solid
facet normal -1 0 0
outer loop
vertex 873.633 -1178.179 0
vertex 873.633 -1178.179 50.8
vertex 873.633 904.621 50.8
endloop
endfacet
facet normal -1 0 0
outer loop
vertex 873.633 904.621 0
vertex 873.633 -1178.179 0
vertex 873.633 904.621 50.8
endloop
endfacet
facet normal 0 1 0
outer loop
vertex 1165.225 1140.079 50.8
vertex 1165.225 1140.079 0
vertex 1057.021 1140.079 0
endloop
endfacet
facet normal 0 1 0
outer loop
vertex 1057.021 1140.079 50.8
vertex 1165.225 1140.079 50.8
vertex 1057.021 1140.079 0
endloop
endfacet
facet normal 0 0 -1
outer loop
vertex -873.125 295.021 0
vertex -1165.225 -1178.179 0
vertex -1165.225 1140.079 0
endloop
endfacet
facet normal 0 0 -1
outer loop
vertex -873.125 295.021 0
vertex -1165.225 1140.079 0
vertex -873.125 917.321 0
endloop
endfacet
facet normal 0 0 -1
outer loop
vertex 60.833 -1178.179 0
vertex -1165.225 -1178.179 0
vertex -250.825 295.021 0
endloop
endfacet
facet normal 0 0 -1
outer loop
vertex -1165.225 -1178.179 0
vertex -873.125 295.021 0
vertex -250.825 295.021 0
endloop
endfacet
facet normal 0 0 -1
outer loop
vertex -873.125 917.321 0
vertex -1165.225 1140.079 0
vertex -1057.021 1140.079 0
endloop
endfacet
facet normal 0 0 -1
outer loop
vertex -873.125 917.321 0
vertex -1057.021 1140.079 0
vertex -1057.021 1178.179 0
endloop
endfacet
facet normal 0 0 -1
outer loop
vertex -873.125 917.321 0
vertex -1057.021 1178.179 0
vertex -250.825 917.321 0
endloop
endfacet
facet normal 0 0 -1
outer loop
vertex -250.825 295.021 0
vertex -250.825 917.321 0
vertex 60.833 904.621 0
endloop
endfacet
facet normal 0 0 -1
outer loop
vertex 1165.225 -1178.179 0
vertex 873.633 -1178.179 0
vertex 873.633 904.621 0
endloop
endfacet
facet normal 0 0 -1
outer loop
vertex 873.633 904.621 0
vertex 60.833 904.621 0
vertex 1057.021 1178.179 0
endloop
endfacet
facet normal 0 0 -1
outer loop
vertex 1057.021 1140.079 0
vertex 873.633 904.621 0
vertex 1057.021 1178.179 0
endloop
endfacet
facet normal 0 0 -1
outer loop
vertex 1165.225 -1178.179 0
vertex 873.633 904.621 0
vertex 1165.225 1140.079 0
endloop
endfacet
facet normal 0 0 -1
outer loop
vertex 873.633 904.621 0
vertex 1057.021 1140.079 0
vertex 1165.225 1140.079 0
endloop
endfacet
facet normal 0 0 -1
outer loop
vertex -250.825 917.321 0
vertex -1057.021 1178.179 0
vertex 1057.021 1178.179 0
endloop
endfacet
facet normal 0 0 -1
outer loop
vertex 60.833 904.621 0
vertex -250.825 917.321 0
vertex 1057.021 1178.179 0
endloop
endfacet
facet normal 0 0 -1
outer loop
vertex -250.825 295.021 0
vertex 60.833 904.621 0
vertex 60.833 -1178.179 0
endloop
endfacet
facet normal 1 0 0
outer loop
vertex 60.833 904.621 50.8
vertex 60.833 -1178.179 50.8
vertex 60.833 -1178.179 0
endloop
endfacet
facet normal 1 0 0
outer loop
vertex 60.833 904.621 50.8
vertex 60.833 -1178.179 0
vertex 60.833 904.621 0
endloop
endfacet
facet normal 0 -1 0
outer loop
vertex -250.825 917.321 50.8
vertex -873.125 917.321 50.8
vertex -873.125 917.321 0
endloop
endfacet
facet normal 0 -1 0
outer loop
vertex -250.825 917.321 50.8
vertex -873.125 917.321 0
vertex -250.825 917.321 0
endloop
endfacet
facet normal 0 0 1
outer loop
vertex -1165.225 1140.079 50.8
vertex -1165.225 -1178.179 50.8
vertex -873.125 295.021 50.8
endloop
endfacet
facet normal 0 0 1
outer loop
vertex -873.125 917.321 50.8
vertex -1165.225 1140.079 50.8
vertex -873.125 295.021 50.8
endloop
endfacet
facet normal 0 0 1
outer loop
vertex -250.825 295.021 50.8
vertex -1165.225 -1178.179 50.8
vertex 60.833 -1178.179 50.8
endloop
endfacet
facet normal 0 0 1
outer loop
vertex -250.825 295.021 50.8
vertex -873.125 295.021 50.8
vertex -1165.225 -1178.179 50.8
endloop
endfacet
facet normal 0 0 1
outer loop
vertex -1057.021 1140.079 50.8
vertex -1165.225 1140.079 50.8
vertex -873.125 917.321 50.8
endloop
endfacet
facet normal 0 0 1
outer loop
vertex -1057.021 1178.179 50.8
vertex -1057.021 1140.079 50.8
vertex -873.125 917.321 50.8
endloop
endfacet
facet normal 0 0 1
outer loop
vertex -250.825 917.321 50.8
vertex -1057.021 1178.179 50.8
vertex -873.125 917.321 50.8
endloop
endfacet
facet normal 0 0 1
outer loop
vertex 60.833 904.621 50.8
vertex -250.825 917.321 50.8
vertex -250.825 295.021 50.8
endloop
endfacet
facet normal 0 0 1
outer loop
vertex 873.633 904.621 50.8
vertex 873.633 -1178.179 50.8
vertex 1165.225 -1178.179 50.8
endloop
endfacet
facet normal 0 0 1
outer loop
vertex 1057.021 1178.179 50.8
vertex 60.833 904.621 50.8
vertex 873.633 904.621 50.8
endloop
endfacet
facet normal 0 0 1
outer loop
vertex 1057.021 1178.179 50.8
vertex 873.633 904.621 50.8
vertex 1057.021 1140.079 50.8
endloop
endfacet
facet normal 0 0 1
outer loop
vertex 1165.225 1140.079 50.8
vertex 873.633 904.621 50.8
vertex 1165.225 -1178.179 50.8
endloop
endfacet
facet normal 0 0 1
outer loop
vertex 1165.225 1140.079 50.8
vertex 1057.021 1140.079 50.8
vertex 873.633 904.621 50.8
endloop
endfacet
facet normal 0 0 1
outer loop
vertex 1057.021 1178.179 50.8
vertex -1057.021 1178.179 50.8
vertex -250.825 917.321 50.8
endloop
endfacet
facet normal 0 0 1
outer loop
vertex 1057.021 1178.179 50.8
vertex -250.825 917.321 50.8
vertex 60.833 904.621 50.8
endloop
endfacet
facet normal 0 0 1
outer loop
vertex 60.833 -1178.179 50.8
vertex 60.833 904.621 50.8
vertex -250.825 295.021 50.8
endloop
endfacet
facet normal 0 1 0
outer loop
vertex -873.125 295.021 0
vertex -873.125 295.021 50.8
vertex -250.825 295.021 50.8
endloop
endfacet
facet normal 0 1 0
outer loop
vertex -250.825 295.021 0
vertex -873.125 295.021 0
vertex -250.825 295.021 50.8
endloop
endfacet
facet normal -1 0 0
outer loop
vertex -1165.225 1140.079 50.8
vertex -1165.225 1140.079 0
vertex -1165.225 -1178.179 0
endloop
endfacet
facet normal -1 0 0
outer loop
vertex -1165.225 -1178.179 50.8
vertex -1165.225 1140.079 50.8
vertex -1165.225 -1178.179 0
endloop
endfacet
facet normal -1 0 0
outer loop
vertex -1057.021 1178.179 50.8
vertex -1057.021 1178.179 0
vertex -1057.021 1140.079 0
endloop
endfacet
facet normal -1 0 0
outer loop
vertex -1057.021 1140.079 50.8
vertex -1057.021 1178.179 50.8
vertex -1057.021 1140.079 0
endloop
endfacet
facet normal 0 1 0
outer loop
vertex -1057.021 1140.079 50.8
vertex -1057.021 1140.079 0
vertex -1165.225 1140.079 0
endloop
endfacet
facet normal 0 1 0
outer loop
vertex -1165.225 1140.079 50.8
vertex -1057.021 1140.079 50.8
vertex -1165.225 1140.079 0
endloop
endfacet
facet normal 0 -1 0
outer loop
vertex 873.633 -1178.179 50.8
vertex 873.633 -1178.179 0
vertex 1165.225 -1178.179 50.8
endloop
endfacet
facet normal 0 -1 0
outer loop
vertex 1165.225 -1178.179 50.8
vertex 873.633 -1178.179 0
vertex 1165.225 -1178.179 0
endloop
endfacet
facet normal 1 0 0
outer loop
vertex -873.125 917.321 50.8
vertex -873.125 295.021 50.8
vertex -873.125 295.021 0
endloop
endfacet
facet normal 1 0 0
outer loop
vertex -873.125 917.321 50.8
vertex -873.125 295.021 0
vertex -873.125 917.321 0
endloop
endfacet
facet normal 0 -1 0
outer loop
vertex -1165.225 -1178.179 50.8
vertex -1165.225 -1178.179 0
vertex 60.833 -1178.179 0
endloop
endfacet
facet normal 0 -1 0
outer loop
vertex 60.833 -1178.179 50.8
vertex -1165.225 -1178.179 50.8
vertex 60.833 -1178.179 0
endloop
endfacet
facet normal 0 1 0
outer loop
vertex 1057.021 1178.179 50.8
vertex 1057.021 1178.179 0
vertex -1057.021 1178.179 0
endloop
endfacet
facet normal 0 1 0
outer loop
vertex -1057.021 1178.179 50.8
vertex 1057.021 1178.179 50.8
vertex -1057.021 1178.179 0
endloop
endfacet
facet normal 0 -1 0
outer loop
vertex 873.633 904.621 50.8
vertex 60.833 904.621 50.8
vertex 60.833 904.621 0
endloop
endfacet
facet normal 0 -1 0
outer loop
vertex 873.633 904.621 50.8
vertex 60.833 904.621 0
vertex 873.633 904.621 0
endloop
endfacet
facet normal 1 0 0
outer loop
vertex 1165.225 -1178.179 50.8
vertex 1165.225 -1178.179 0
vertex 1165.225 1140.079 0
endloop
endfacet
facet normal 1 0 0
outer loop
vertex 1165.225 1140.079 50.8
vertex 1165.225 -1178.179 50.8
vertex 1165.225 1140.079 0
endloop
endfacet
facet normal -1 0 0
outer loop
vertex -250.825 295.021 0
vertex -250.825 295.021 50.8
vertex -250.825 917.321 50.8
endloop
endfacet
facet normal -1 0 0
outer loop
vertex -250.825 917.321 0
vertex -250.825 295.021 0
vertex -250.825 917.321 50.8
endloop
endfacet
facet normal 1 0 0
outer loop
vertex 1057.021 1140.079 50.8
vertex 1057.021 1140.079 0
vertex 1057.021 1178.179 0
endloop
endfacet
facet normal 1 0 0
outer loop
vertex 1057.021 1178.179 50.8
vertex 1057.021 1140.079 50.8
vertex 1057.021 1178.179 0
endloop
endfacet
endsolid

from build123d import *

# Parameters (mm, degrees)
BOSS_EXTRUDE1_DEPTH = 50.8
SKETCH2_W           = 622.3
SKETCH2_H           = 622.3
SKETCH2_W_2         = 812.8
SKETCH2_H_2         = 2082.8
CUT_EXTRUDE1_DEPTH  = 50.8


with BuildPart() as part:
    # Sketch1 → Boss-Extrude1 (new body)
    with BuildSketch(Plane.XY):
        Polygon((1057.021, 1178.179), (-1057.021, 1178.179), (-1057.021, 1140.079), (-1165.225, 1140.079), (-1165.225, -1178.179), (1165.225, -1178.179), (1165.225, 1140.079), (1057.021, 1140.079), align=None)
    extrude(amount=BOSS_EXTRUDE1_DEPTH)

    # Sketch2 → Cut-Extrude1 (cut)
    with BuildSketch(Plane.XY.offset(50.8)):
        with Locations((-561.975, 606.171)):
            Rectangle(SKETCH2_W, SKETCH2_H)
        with Locations((467.233, -136.779)):
            Rectangle(SKETCH2_W_2, SKETCH2_H_2)
    extrude(amount=-CUT_EXTRUDE1_DEPTH, mode=Mode.SUBTRACT)


solid = part.part
